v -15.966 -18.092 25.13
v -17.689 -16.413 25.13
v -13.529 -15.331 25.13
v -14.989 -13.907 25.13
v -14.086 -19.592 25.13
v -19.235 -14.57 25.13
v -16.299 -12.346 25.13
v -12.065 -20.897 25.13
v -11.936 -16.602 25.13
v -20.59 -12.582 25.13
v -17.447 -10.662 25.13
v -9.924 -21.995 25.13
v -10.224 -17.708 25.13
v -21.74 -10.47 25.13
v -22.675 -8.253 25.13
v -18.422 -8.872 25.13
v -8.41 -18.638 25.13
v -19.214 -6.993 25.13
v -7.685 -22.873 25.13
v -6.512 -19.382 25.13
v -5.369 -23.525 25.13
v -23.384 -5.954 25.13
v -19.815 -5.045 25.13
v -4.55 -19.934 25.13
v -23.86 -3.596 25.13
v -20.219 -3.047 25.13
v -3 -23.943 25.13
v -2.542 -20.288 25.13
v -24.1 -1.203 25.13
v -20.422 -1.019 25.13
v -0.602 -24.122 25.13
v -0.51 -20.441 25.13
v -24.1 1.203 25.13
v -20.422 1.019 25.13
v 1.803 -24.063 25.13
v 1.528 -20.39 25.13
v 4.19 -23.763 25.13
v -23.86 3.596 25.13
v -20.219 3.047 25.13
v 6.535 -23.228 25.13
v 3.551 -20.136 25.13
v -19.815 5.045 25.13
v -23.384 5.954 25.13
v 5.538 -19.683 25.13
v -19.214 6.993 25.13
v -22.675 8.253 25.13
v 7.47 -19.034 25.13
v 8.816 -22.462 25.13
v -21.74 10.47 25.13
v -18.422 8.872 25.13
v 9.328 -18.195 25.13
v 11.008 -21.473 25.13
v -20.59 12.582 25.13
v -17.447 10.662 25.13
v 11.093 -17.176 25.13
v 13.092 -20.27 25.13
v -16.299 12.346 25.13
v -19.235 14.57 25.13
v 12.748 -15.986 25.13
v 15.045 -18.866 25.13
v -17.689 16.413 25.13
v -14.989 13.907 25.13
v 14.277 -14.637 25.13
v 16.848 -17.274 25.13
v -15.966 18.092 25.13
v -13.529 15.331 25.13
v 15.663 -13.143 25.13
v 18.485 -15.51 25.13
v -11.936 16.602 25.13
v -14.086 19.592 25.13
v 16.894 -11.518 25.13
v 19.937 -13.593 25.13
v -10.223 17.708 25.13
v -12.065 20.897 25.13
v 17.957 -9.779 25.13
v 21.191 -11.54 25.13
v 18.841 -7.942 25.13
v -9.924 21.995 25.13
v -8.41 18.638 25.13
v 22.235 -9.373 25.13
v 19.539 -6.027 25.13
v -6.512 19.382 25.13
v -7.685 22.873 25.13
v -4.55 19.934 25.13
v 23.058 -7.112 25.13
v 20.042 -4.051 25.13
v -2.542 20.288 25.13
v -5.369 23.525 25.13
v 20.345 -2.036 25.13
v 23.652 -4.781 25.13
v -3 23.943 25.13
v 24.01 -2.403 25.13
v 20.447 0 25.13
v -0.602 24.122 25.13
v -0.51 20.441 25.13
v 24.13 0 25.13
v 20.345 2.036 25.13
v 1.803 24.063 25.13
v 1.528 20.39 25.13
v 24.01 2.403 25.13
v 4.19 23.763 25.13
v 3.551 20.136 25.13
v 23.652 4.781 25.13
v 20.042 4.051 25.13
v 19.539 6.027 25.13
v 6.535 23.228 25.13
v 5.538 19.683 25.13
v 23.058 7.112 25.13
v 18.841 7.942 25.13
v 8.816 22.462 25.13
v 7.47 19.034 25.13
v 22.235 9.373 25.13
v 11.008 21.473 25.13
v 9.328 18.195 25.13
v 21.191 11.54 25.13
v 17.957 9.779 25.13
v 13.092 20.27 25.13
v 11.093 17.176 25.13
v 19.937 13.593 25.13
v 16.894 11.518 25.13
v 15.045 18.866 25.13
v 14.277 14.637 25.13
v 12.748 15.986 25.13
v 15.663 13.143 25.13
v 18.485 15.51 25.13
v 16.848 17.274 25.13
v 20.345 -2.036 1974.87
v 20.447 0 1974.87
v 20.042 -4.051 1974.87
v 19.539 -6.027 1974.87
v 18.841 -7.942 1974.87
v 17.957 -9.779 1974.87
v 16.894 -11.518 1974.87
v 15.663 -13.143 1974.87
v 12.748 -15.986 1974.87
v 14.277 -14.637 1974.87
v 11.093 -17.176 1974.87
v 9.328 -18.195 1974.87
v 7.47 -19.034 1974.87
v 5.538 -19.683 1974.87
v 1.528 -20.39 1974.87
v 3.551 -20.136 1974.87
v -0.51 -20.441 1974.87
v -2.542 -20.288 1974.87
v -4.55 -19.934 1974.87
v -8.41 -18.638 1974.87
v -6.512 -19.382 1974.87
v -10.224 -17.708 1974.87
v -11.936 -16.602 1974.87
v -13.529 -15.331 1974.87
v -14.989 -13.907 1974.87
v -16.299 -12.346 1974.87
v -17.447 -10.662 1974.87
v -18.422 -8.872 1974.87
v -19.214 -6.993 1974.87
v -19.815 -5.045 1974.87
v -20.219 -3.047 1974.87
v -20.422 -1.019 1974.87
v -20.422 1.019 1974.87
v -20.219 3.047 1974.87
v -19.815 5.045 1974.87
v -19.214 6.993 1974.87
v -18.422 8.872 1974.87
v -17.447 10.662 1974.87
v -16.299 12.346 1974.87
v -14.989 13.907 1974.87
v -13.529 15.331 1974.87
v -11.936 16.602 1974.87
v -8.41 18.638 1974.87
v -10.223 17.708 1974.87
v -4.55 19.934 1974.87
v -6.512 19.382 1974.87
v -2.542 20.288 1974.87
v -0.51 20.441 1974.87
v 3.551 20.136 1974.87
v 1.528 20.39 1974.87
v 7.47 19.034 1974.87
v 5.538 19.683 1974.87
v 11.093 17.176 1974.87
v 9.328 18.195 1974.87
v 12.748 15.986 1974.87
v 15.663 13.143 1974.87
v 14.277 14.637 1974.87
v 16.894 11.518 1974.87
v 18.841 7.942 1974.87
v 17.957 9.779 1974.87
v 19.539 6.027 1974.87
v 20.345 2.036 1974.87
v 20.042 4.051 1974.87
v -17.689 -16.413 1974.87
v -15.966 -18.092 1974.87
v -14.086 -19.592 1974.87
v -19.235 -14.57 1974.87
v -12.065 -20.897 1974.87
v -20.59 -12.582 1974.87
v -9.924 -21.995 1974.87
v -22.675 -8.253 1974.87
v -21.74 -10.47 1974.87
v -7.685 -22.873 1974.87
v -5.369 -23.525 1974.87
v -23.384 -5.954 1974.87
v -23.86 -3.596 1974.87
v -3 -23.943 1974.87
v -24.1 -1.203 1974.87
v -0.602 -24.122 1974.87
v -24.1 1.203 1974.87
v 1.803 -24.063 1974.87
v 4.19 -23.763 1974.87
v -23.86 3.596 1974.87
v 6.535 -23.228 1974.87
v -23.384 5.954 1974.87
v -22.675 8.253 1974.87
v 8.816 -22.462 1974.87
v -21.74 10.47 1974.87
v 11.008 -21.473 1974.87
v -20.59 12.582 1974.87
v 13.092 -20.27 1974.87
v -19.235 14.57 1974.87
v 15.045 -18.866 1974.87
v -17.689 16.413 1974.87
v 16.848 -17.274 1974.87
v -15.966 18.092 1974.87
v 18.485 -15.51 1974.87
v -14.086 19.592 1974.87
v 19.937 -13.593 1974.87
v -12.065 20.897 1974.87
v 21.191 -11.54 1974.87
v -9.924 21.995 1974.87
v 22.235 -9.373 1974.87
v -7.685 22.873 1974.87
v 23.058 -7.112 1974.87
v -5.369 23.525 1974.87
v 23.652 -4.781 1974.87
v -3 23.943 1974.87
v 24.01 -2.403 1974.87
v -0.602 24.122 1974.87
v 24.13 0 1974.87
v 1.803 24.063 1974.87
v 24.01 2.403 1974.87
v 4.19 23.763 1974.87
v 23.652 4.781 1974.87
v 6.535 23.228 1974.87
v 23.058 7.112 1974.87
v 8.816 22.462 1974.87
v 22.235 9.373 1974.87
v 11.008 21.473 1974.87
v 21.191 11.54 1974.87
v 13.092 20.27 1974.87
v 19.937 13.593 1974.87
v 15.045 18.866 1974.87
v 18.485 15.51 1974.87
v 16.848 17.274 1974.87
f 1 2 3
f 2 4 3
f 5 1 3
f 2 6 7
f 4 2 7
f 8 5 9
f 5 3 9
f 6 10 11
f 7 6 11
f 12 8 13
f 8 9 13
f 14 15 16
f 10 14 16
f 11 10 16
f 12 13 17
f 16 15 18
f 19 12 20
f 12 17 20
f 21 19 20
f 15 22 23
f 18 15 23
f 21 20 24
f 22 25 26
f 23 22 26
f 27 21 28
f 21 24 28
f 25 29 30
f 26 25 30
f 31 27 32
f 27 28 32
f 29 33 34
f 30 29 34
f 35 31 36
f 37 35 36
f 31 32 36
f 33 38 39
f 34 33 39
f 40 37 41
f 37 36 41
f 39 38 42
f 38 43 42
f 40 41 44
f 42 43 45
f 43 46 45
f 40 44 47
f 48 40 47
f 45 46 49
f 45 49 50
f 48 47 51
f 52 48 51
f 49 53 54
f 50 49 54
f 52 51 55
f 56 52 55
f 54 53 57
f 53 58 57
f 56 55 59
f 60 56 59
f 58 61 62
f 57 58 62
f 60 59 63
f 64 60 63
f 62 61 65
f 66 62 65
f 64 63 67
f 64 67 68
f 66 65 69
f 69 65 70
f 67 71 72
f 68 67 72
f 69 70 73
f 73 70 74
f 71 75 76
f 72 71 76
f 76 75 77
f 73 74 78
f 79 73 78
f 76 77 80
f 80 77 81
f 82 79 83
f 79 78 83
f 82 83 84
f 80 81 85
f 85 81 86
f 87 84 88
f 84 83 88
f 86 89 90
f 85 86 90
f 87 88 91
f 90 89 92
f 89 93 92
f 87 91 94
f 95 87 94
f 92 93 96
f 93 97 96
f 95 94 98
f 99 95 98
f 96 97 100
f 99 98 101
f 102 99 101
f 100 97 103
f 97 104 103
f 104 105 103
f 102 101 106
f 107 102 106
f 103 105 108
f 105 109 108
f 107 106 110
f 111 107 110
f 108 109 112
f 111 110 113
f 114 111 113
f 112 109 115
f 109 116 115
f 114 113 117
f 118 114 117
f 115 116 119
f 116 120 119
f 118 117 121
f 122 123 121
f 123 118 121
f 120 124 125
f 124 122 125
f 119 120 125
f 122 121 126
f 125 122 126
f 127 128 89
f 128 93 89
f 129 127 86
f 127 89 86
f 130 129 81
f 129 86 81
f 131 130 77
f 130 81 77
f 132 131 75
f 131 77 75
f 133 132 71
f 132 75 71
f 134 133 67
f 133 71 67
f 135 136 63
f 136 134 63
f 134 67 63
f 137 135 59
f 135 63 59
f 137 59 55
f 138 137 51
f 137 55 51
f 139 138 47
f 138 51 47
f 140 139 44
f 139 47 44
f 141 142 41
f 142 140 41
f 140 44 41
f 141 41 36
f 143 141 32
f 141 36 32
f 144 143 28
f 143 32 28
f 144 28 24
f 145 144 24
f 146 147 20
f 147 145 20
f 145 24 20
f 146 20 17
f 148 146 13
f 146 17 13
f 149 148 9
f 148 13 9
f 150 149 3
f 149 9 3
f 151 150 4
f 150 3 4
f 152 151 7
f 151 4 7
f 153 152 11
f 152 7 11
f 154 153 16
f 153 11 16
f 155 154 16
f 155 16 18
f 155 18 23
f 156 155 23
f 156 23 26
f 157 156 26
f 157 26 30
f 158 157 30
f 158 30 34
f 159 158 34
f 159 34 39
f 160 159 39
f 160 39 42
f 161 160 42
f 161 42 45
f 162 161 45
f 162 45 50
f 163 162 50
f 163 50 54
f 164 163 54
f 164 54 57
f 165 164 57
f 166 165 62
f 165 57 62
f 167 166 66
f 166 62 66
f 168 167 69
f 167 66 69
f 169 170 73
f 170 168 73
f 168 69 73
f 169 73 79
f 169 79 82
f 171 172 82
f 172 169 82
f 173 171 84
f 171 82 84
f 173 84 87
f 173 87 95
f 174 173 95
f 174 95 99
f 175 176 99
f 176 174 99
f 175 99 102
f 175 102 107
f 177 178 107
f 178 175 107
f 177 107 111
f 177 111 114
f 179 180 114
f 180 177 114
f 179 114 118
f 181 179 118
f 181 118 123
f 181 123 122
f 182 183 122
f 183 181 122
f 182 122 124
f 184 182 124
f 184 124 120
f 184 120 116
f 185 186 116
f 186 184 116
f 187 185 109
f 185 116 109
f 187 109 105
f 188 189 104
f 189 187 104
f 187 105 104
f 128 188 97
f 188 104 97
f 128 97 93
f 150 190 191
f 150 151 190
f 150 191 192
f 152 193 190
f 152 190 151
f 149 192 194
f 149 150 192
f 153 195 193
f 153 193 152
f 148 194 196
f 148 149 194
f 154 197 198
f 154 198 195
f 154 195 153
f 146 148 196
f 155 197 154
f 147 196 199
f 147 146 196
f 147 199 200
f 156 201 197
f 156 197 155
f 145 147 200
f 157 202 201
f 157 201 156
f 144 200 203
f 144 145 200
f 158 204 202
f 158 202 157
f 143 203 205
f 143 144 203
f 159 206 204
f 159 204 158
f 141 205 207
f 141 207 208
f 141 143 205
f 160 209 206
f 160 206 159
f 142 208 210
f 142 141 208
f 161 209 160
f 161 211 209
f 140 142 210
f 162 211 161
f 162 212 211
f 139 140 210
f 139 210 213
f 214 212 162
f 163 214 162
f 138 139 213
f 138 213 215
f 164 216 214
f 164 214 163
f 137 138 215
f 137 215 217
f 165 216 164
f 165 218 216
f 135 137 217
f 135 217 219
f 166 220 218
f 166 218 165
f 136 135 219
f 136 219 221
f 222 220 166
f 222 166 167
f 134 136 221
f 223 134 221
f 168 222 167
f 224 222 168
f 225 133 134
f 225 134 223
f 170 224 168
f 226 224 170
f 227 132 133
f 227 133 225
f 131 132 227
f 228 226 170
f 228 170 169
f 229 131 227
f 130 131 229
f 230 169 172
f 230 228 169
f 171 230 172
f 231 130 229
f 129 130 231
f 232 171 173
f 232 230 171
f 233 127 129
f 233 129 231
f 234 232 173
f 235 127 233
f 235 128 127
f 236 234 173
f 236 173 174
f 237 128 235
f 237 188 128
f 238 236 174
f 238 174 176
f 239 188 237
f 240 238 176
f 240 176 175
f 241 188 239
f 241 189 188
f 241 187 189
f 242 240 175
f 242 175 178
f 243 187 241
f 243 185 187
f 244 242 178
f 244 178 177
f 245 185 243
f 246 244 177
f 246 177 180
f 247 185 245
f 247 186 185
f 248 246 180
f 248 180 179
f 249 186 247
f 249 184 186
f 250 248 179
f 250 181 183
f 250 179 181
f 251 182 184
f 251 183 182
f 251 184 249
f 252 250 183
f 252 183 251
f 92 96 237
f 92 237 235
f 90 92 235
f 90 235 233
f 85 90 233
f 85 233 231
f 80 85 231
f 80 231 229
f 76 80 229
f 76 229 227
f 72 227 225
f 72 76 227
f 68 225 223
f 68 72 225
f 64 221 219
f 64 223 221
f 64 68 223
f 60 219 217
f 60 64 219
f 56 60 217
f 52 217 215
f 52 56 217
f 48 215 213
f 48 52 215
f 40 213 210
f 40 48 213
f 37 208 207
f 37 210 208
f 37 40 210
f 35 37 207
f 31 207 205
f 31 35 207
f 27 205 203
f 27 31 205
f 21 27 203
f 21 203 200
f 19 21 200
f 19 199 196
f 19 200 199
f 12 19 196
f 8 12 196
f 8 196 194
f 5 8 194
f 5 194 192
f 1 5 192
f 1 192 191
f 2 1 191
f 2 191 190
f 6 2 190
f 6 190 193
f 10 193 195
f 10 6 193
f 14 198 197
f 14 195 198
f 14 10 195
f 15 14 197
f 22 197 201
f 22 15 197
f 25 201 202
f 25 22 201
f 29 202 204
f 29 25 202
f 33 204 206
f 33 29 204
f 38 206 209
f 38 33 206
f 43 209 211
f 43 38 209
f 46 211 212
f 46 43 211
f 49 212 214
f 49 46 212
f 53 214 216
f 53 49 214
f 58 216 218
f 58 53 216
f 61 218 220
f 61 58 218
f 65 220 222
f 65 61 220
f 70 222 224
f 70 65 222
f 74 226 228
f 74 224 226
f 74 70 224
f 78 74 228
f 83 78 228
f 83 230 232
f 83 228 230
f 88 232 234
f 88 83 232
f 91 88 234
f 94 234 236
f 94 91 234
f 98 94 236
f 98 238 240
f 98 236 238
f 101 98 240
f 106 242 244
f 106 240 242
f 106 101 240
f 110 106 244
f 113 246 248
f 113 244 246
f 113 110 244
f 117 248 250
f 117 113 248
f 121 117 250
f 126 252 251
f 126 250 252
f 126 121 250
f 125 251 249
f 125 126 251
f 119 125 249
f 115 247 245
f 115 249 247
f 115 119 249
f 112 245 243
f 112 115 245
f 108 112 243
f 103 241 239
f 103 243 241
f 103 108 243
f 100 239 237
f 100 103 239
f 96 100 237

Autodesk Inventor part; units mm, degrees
ref_plane "Start Plane" through (0, 0, 25.13) normal (0, 0, 1) x (1, 0, 0)
ref_plane "End Plane" through (0, 0, 1974.87) normal (0, 0, 1) x (1, 0, 0)
sketch "Sketch" plane through (0, 0, 0) normal (0, 0, 1) x (1, 0, 0)
  circle A0 centre (0, 0) radius 20.447
  circle A1 centre (0, 0) radius 24.13
  dimension "d0" = 48.26
  dimension "d1" = 3.683
extrude "Body" add sketch "Sketch" along normal up to surface (1949.74 mm away) from surface at 25.13
sketch "Sketch3" plane through (0, 0, 0) normal (0, 0, 1) x (1, 0, 0)
  line L0 (0, 0) -> (10, 0)
ref_plane "Work Plane3" through (0, 0, 0) normal (0, -1, 0) x (1, 0, 0)
ref_plane "Work Plane4" through (0, 200, 25.13) normal (0, 0, -1) x (-1, 0, 0)
split "Split1" plane through (0, 200, 25.13) removes the side toward (0, 0, -1)
ref_plane "Work Plane5" through (0, 200, 1974.87) normal (0, 0, 1) x (1, 0, 0)
split "Split2" plane through (0, 200, 1974.87) removes the side toward (0, 0, 1)
sketch "Sketch4" plane through (0, 0, 0) normal (0, -1, 0) x (1, 0, 0)
  line L0 (-2, 25.13) -> (12, 25.13) projected
  line L1 (-2, 1974.87) -> (12, 1974.87) projected
  dimension "d7" = 1949.74
equation "\"d0\" = G_H"
equation "\"d1\" = G_T"
equation "\"d2\" = G_L"
equation "\"G_H\" = 48.26"
equation "\"G_T\" = 3.683"
equation "\"G_L\" = d7"
equation "\"G_OFFSET_START\" = -25.13"
equation "\"G_OFFSET_END\" = -25.13"
equation "\"d4\" = -G_OFFSET_START"
equation "\"d5\" = G_OFFSET_END + B_L"
equation "\"B_L\" = 2000"
properties part number "ANSI - 1 1/2 x 0.145 - 76.761" material "Steel, Mild"
